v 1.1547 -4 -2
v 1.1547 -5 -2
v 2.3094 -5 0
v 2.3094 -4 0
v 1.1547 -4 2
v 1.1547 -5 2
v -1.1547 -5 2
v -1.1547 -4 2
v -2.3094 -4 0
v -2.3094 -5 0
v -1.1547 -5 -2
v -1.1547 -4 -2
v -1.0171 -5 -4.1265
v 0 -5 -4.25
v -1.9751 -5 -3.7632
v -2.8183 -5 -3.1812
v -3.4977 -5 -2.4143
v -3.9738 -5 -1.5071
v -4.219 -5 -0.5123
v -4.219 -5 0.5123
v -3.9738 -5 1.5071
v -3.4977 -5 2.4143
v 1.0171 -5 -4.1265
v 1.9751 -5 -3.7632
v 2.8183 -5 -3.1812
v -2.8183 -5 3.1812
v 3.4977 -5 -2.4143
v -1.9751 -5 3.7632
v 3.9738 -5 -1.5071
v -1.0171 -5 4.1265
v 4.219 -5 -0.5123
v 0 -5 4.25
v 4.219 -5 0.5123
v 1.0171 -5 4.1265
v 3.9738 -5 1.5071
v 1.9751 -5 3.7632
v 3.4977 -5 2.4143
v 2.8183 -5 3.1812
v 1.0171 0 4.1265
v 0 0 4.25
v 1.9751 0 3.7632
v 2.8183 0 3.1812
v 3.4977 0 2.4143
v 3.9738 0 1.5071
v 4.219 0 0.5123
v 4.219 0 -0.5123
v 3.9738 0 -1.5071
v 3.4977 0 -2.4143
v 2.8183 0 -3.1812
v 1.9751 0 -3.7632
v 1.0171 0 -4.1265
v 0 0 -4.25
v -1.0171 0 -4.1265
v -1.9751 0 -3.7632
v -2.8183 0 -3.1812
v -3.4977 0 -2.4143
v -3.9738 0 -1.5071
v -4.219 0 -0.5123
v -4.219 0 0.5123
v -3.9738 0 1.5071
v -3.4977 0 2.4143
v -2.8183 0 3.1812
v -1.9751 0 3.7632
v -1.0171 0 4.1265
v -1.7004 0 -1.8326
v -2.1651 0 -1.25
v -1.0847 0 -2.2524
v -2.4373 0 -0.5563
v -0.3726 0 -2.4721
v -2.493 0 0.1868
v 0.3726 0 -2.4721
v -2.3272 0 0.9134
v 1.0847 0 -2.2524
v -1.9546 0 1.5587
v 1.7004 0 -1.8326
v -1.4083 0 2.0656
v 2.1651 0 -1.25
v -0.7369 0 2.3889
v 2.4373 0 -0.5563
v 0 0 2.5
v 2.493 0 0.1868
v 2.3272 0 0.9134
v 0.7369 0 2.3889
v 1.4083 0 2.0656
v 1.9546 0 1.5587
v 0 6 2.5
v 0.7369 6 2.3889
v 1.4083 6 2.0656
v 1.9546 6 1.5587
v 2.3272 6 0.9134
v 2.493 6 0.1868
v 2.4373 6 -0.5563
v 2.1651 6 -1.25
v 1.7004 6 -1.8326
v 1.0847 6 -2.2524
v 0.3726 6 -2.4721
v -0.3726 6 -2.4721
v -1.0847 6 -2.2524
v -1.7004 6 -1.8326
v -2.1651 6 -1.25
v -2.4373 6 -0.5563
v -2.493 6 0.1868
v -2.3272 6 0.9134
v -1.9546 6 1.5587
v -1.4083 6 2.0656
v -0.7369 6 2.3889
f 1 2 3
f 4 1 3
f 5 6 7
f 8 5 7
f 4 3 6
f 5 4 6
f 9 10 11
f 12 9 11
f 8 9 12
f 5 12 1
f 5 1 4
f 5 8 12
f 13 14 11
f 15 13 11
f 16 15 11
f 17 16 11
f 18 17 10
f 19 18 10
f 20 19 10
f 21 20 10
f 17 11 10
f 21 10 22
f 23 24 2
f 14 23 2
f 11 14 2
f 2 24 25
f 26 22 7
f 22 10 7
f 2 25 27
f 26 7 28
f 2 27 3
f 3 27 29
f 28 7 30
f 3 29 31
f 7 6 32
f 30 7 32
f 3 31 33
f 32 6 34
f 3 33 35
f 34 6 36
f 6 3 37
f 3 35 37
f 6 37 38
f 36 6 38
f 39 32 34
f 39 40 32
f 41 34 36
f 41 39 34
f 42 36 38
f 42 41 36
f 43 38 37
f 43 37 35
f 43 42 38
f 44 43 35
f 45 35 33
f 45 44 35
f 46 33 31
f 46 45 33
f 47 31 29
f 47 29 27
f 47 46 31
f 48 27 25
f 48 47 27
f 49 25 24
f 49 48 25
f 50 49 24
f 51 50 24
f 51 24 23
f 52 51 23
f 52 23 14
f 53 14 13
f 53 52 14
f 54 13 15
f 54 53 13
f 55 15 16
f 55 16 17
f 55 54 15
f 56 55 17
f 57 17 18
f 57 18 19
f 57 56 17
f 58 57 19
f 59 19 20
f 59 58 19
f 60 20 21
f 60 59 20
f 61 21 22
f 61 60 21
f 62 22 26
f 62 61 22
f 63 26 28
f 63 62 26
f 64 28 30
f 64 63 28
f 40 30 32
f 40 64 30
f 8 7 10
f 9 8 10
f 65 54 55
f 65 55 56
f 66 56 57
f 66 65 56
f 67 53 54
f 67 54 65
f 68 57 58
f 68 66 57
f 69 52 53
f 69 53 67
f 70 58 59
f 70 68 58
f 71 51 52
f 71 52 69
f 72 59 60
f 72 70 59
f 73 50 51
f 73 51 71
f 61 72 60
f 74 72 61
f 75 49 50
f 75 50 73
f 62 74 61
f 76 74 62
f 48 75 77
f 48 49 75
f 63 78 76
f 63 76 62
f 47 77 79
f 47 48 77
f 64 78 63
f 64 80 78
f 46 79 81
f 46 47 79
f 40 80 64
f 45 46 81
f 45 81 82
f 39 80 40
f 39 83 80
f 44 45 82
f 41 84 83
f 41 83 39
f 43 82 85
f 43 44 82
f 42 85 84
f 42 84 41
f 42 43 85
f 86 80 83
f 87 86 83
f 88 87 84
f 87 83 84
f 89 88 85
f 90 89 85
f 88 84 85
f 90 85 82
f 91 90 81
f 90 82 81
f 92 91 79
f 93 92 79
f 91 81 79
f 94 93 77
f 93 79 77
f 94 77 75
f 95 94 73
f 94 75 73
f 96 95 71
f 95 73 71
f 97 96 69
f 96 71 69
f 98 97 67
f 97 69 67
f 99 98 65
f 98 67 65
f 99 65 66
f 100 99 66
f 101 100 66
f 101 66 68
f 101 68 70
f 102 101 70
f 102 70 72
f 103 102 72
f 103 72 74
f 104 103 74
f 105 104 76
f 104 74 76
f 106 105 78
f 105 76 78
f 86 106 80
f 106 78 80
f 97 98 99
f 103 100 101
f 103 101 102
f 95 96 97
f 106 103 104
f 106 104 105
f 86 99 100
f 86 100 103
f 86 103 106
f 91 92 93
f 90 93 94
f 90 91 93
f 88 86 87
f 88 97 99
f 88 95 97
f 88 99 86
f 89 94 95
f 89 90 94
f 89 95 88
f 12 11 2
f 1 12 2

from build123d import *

# Parameters (mm, degrees)
SKETCH_2_W          = 4.25
SKETCH_2_H          = 5
SKETCH_3_R          = 2.5
EXTRUDE_1_DEPTH     = 6
CUT_EXTRUDE_1_DEPTH = 1


with BuildPart() as part:
    # 草图2 → 旋转1 (revolve)
    with BuildSketch(Plane(origin=(0, 0, 0), x_dir=(-1, 0, 0), z_dir=(0, 0, -1)), mode=Mode.PRIVATE) as revolve_1_sk:
        with Locations((-2.125, -2.5)):
            Rectangle(SKETCH_2_W, SKETCH_2_H)
    revolve(revolve_1_sk.sketch.rotate(Axis((0, -5, 0), (0, 1, 0)), 270), axis=Axis((0, -5, 0), (0, 1, 0)))

    # 草图3 → 凸台-拉伸1 (add)
    with BuildSketch(Plane(origin=(0, 0, 0), x_dir=(-1, 0, 0), z_dir=(0, 1, 0))):
        with Locations(Location((0, 0, 0), (0, 0, 90))):
            Circle(SKETCH_3_R)
    extrude(amount=EXTRUDE_1_DEPTH)

    # 草图4 → 切除-拉伸1 (cut)
    with BuildSketch(Plane.XZ.offset(5)):
        Polygon((-1.154700538, -2), (1.154700538, -2), (2.309401077, 0), (1.154700538, 2), (-1.154700538, 2), (-2.309401077, 0), align=None)
    extrude(amount=-CUT_EXTRUDE_1_DEPTH, mode=Mode.SUBTRACT)


solid = part.part
